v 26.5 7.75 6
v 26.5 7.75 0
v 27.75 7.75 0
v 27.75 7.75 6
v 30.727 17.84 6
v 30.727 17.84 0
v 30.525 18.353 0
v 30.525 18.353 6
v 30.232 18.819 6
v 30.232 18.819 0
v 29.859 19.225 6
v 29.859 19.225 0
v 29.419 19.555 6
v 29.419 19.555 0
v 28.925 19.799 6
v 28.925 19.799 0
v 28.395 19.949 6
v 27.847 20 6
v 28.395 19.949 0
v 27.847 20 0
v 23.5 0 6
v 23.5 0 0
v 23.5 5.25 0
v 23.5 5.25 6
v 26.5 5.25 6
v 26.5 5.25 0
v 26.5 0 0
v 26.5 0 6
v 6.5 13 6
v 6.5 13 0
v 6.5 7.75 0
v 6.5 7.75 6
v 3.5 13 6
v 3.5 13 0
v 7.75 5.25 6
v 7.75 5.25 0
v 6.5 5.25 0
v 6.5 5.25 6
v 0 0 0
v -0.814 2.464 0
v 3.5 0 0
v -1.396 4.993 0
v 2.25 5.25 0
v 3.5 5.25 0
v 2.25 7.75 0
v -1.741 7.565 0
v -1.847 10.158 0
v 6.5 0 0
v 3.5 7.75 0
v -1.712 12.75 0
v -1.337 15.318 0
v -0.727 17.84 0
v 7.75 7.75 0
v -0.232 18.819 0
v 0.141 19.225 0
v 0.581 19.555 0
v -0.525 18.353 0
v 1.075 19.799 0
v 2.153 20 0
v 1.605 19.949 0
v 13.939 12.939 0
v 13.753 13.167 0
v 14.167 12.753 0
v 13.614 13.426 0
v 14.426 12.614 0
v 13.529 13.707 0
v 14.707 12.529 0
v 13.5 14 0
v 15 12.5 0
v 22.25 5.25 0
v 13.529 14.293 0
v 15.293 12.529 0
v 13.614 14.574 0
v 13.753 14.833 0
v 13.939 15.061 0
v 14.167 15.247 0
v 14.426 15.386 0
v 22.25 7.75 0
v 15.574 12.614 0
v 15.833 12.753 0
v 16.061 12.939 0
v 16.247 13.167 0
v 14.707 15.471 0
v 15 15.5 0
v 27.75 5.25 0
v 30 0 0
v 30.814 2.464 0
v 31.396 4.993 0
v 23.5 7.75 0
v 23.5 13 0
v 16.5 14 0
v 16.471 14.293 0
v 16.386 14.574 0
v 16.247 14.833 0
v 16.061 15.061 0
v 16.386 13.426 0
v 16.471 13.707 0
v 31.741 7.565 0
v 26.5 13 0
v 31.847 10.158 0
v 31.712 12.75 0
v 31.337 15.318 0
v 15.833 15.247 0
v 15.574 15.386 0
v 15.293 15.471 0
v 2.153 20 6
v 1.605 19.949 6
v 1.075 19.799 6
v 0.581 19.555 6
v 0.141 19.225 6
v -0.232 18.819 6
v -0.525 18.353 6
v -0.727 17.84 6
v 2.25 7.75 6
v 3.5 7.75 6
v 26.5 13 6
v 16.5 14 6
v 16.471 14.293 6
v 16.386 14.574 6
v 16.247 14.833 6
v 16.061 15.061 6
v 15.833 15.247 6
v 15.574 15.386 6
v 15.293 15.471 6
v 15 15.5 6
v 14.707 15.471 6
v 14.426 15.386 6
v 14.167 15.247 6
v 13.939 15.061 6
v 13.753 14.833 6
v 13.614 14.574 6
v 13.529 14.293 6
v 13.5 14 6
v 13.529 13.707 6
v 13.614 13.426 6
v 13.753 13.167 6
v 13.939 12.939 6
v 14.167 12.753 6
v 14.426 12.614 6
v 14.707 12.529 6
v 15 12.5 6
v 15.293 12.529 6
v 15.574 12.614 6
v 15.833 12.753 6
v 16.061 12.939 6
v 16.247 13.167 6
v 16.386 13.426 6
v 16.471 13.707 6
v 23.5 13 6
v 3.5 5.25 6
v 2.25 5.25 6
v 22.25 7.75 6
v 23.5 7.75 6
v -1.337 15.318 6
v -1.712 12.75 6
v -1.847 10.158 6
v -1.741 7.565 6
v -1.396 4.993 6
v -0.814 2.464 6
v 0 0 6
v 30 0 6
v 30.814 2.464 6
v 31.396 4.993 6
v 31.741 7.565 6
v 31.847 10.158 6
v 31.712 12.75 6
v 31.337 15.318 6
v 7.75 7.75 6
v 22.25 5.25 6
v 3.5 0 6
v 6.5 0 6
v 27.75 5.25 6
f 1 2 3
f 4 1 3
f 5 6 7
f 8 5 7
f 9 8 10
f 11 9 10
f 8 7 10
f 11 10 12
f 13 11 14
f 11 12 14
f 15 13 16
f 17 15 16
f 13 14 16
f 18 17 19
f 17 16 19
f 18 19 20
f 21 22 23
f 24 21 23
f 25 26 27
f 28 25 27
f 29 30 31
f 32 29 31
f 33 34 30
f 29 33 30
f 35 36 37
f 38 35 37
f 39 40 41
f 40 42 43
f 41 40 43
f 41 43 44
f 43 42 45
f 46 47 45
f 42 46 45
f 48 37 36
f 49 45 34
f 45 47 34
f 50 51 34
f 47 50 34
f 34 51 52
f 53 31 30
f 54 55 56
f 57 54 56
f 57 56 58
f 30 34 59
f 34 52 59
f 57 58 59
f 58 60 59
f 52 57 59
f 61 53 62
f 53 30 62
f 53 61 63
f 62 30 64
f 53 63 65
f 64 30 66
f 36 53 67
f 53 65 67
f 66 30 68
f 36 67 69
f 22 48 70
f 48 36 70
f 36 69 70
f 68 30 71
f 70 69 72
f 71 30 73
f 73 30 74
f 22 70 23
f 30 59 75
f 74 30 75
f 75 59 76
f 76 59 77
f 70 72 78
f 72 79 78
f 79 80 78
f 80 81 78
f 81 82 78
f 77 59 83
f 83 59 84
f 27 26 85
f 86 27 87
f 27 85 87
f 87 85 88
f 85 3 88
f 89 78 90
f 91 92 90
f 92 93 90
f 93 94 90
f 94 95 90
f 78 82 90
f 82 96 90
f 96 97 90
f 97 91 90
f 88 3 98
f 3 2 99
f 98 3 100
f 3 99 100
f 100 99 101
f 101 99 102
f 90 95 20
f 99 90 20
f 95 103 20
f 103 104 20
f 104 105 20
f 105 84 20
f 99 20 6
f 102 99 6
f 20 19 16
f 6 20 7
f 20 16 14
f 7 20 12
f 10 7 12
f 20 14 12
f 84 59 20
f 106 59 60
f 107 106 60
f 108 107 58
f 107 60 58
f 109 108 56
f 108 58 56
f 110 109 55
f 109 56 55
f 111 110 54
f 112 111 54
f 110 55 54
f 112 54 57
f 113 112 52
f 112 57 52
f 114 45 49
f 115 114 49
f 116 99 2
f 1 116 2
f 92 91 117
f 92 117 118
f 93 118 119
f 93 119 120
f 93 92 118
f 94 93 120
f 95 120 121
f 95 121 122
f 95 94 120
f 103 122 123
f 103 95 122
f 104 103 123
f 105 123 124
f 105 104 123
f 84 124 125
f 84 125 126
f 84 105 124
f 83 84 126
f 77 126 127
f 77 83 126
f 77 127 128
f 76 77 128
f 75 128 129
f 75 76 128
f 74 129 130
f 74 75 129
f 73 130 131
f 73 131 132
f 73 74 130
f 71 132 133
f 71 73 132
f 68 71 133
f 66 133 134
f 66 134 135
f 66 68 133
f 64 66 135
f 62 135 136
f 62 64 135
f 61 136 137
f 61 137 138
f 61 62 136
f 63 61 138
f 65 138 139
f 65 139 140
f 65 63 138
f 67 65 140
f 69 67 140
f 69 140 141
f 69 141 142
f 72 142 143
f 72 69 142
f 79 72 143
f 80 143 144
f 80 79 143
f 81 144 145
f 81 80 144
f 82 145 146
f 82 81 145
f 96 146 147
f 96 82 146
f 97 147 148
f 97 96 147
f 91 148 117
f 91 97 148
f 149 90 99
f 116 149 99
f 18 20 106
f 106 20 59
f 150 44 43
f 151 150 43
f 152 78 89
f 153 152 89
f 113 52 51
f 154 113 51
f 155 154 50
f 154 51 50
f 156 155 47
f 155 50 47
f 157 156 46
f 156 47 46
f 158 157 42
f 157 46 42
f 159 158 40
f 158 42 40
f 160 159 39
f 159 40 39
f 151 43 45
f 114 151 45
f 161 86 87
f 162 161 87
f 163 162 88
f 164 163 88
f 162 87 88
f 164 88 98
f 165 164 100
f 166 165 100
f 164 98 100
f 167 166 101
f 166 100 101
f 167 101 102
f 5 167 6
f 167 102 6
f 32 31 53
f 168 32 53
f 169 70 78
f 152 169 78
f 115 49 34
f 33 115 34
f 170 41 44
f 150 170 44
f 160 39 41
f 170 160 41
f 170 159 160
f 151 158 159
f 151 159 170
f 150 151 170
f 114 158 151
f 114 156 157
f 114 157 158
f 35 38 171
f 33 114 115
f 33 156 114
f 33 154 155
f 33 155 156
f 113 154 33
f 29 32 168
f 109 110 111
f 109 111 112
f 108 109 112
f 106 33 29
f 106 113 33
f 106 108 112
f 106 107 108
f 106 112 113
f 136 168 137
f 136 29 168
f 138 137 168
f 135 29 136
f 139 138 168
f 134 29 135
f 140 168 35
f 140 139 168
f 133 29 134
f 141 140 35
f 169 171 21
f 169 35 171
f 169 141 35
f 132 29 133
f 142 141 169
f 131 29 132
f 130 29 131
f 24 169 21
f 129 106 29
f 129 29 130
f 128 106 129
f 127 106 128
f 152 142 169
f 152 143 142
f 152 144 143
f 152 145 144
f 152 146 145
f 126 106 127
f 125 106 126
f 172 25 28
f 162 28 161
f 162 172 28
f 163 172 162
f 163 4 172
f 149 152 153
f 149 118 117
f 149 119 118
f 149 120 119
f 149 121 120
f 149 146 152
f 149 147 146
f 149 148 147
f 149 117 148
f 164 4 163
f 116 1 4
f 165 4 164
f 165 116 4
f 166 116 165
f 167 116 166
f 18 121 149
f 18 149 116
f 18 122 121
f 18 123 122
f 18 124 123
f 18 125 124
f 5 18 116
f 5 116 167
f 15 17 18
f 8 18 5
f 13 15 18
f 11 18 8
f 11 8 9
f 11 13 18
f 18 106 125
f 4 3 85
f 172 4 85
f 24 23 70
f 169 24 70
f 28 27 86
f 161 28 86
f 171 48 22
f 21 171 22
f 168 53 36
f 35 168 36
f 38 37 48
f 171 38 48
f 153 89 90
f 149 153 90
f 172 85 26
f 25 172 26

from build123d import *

# Parameters (mm, degrees)
SKETCH_1_R      = 1.5
EXTRUDE_1_DEPTH = 6


with BuildPart() as part:
    # Эскиз1 → Бобышка-Вытянуть1 (new body)
    with BuildSketch(Plane.XY):
        with BuildLine():
            Line((0, 0), (3.5, 0))
            Line((3.5, 0), (3.5, 5.25))
            Line((3.5, 5.25), (2.25, 5.25))
            Line((2.25, 5.25), (2.25, 7.75))
            Line((2.25, 7.75), (3.5, 7.75))
            Line((3.5, 7.75), (3.5, 13))
            Line((3.5, 13), (6.5, 13))
            Line((6.5, 13), (6.5, 7.75))
            Line((6.5, 7.75), (7.75, 7.75))
            Line((7.75, 7.75), (7.75, 5.25))
            Line((7.75, 5.25), (6.5, 5.25))
            Line((6.5, 5.25), (6.5, 0))
            Line((6.5, 0), (23.5, 0))
            Line((23.5, 0), (23.5, 5.25))
            Line((23.5, 5.25), (22.25, 5.25))
            Line((22.25, 5.25), (22.25, 7.75))
            Line((22.25, 7.75), (23.5, 7.75))
            Line((23.5, 7.75), (23.5, 13))
            Line((23.5, 13), (26.5, 13))
            Line((26.5, 13), (26.5, 7.75))
            Line((26.5, 7.75), (27.75, 7.75))
            Line((27.75, 7.75), (27.75, 5.25))
            Line((27.75, 5.25), (26.5, 5.25))
            Line((26.5, 5.25), (26.5, 0))
            Line((26.5, 0), (30, 0))
            ThreePointArc((30, 0), (31.823751247, 8.860593438), (30.726698908, 17.840162517))
            ThreePointArc((30.726698908, 17.840162517), (29.646678597, 19.400050786), (27.846746313, 20))
            Line((27.846746313, 20), (2.153253687, 20))
            ThreePointArc((2.153253687, 20), (0.353321403, 19.400050786), (-0.726698908, 17.840162517))
            ThreePointArc((-0.726698908, 17.840162517), (-1.823751247, 8.860593438), (0, 0))
        make_face()
        with Locations((15, 14)):
            Circle(SKETCH_1_R, mode=Mode.SUBTRACT)
    extrude(amount=EXTRUDE_1_DEPTH)


solid = part.part
